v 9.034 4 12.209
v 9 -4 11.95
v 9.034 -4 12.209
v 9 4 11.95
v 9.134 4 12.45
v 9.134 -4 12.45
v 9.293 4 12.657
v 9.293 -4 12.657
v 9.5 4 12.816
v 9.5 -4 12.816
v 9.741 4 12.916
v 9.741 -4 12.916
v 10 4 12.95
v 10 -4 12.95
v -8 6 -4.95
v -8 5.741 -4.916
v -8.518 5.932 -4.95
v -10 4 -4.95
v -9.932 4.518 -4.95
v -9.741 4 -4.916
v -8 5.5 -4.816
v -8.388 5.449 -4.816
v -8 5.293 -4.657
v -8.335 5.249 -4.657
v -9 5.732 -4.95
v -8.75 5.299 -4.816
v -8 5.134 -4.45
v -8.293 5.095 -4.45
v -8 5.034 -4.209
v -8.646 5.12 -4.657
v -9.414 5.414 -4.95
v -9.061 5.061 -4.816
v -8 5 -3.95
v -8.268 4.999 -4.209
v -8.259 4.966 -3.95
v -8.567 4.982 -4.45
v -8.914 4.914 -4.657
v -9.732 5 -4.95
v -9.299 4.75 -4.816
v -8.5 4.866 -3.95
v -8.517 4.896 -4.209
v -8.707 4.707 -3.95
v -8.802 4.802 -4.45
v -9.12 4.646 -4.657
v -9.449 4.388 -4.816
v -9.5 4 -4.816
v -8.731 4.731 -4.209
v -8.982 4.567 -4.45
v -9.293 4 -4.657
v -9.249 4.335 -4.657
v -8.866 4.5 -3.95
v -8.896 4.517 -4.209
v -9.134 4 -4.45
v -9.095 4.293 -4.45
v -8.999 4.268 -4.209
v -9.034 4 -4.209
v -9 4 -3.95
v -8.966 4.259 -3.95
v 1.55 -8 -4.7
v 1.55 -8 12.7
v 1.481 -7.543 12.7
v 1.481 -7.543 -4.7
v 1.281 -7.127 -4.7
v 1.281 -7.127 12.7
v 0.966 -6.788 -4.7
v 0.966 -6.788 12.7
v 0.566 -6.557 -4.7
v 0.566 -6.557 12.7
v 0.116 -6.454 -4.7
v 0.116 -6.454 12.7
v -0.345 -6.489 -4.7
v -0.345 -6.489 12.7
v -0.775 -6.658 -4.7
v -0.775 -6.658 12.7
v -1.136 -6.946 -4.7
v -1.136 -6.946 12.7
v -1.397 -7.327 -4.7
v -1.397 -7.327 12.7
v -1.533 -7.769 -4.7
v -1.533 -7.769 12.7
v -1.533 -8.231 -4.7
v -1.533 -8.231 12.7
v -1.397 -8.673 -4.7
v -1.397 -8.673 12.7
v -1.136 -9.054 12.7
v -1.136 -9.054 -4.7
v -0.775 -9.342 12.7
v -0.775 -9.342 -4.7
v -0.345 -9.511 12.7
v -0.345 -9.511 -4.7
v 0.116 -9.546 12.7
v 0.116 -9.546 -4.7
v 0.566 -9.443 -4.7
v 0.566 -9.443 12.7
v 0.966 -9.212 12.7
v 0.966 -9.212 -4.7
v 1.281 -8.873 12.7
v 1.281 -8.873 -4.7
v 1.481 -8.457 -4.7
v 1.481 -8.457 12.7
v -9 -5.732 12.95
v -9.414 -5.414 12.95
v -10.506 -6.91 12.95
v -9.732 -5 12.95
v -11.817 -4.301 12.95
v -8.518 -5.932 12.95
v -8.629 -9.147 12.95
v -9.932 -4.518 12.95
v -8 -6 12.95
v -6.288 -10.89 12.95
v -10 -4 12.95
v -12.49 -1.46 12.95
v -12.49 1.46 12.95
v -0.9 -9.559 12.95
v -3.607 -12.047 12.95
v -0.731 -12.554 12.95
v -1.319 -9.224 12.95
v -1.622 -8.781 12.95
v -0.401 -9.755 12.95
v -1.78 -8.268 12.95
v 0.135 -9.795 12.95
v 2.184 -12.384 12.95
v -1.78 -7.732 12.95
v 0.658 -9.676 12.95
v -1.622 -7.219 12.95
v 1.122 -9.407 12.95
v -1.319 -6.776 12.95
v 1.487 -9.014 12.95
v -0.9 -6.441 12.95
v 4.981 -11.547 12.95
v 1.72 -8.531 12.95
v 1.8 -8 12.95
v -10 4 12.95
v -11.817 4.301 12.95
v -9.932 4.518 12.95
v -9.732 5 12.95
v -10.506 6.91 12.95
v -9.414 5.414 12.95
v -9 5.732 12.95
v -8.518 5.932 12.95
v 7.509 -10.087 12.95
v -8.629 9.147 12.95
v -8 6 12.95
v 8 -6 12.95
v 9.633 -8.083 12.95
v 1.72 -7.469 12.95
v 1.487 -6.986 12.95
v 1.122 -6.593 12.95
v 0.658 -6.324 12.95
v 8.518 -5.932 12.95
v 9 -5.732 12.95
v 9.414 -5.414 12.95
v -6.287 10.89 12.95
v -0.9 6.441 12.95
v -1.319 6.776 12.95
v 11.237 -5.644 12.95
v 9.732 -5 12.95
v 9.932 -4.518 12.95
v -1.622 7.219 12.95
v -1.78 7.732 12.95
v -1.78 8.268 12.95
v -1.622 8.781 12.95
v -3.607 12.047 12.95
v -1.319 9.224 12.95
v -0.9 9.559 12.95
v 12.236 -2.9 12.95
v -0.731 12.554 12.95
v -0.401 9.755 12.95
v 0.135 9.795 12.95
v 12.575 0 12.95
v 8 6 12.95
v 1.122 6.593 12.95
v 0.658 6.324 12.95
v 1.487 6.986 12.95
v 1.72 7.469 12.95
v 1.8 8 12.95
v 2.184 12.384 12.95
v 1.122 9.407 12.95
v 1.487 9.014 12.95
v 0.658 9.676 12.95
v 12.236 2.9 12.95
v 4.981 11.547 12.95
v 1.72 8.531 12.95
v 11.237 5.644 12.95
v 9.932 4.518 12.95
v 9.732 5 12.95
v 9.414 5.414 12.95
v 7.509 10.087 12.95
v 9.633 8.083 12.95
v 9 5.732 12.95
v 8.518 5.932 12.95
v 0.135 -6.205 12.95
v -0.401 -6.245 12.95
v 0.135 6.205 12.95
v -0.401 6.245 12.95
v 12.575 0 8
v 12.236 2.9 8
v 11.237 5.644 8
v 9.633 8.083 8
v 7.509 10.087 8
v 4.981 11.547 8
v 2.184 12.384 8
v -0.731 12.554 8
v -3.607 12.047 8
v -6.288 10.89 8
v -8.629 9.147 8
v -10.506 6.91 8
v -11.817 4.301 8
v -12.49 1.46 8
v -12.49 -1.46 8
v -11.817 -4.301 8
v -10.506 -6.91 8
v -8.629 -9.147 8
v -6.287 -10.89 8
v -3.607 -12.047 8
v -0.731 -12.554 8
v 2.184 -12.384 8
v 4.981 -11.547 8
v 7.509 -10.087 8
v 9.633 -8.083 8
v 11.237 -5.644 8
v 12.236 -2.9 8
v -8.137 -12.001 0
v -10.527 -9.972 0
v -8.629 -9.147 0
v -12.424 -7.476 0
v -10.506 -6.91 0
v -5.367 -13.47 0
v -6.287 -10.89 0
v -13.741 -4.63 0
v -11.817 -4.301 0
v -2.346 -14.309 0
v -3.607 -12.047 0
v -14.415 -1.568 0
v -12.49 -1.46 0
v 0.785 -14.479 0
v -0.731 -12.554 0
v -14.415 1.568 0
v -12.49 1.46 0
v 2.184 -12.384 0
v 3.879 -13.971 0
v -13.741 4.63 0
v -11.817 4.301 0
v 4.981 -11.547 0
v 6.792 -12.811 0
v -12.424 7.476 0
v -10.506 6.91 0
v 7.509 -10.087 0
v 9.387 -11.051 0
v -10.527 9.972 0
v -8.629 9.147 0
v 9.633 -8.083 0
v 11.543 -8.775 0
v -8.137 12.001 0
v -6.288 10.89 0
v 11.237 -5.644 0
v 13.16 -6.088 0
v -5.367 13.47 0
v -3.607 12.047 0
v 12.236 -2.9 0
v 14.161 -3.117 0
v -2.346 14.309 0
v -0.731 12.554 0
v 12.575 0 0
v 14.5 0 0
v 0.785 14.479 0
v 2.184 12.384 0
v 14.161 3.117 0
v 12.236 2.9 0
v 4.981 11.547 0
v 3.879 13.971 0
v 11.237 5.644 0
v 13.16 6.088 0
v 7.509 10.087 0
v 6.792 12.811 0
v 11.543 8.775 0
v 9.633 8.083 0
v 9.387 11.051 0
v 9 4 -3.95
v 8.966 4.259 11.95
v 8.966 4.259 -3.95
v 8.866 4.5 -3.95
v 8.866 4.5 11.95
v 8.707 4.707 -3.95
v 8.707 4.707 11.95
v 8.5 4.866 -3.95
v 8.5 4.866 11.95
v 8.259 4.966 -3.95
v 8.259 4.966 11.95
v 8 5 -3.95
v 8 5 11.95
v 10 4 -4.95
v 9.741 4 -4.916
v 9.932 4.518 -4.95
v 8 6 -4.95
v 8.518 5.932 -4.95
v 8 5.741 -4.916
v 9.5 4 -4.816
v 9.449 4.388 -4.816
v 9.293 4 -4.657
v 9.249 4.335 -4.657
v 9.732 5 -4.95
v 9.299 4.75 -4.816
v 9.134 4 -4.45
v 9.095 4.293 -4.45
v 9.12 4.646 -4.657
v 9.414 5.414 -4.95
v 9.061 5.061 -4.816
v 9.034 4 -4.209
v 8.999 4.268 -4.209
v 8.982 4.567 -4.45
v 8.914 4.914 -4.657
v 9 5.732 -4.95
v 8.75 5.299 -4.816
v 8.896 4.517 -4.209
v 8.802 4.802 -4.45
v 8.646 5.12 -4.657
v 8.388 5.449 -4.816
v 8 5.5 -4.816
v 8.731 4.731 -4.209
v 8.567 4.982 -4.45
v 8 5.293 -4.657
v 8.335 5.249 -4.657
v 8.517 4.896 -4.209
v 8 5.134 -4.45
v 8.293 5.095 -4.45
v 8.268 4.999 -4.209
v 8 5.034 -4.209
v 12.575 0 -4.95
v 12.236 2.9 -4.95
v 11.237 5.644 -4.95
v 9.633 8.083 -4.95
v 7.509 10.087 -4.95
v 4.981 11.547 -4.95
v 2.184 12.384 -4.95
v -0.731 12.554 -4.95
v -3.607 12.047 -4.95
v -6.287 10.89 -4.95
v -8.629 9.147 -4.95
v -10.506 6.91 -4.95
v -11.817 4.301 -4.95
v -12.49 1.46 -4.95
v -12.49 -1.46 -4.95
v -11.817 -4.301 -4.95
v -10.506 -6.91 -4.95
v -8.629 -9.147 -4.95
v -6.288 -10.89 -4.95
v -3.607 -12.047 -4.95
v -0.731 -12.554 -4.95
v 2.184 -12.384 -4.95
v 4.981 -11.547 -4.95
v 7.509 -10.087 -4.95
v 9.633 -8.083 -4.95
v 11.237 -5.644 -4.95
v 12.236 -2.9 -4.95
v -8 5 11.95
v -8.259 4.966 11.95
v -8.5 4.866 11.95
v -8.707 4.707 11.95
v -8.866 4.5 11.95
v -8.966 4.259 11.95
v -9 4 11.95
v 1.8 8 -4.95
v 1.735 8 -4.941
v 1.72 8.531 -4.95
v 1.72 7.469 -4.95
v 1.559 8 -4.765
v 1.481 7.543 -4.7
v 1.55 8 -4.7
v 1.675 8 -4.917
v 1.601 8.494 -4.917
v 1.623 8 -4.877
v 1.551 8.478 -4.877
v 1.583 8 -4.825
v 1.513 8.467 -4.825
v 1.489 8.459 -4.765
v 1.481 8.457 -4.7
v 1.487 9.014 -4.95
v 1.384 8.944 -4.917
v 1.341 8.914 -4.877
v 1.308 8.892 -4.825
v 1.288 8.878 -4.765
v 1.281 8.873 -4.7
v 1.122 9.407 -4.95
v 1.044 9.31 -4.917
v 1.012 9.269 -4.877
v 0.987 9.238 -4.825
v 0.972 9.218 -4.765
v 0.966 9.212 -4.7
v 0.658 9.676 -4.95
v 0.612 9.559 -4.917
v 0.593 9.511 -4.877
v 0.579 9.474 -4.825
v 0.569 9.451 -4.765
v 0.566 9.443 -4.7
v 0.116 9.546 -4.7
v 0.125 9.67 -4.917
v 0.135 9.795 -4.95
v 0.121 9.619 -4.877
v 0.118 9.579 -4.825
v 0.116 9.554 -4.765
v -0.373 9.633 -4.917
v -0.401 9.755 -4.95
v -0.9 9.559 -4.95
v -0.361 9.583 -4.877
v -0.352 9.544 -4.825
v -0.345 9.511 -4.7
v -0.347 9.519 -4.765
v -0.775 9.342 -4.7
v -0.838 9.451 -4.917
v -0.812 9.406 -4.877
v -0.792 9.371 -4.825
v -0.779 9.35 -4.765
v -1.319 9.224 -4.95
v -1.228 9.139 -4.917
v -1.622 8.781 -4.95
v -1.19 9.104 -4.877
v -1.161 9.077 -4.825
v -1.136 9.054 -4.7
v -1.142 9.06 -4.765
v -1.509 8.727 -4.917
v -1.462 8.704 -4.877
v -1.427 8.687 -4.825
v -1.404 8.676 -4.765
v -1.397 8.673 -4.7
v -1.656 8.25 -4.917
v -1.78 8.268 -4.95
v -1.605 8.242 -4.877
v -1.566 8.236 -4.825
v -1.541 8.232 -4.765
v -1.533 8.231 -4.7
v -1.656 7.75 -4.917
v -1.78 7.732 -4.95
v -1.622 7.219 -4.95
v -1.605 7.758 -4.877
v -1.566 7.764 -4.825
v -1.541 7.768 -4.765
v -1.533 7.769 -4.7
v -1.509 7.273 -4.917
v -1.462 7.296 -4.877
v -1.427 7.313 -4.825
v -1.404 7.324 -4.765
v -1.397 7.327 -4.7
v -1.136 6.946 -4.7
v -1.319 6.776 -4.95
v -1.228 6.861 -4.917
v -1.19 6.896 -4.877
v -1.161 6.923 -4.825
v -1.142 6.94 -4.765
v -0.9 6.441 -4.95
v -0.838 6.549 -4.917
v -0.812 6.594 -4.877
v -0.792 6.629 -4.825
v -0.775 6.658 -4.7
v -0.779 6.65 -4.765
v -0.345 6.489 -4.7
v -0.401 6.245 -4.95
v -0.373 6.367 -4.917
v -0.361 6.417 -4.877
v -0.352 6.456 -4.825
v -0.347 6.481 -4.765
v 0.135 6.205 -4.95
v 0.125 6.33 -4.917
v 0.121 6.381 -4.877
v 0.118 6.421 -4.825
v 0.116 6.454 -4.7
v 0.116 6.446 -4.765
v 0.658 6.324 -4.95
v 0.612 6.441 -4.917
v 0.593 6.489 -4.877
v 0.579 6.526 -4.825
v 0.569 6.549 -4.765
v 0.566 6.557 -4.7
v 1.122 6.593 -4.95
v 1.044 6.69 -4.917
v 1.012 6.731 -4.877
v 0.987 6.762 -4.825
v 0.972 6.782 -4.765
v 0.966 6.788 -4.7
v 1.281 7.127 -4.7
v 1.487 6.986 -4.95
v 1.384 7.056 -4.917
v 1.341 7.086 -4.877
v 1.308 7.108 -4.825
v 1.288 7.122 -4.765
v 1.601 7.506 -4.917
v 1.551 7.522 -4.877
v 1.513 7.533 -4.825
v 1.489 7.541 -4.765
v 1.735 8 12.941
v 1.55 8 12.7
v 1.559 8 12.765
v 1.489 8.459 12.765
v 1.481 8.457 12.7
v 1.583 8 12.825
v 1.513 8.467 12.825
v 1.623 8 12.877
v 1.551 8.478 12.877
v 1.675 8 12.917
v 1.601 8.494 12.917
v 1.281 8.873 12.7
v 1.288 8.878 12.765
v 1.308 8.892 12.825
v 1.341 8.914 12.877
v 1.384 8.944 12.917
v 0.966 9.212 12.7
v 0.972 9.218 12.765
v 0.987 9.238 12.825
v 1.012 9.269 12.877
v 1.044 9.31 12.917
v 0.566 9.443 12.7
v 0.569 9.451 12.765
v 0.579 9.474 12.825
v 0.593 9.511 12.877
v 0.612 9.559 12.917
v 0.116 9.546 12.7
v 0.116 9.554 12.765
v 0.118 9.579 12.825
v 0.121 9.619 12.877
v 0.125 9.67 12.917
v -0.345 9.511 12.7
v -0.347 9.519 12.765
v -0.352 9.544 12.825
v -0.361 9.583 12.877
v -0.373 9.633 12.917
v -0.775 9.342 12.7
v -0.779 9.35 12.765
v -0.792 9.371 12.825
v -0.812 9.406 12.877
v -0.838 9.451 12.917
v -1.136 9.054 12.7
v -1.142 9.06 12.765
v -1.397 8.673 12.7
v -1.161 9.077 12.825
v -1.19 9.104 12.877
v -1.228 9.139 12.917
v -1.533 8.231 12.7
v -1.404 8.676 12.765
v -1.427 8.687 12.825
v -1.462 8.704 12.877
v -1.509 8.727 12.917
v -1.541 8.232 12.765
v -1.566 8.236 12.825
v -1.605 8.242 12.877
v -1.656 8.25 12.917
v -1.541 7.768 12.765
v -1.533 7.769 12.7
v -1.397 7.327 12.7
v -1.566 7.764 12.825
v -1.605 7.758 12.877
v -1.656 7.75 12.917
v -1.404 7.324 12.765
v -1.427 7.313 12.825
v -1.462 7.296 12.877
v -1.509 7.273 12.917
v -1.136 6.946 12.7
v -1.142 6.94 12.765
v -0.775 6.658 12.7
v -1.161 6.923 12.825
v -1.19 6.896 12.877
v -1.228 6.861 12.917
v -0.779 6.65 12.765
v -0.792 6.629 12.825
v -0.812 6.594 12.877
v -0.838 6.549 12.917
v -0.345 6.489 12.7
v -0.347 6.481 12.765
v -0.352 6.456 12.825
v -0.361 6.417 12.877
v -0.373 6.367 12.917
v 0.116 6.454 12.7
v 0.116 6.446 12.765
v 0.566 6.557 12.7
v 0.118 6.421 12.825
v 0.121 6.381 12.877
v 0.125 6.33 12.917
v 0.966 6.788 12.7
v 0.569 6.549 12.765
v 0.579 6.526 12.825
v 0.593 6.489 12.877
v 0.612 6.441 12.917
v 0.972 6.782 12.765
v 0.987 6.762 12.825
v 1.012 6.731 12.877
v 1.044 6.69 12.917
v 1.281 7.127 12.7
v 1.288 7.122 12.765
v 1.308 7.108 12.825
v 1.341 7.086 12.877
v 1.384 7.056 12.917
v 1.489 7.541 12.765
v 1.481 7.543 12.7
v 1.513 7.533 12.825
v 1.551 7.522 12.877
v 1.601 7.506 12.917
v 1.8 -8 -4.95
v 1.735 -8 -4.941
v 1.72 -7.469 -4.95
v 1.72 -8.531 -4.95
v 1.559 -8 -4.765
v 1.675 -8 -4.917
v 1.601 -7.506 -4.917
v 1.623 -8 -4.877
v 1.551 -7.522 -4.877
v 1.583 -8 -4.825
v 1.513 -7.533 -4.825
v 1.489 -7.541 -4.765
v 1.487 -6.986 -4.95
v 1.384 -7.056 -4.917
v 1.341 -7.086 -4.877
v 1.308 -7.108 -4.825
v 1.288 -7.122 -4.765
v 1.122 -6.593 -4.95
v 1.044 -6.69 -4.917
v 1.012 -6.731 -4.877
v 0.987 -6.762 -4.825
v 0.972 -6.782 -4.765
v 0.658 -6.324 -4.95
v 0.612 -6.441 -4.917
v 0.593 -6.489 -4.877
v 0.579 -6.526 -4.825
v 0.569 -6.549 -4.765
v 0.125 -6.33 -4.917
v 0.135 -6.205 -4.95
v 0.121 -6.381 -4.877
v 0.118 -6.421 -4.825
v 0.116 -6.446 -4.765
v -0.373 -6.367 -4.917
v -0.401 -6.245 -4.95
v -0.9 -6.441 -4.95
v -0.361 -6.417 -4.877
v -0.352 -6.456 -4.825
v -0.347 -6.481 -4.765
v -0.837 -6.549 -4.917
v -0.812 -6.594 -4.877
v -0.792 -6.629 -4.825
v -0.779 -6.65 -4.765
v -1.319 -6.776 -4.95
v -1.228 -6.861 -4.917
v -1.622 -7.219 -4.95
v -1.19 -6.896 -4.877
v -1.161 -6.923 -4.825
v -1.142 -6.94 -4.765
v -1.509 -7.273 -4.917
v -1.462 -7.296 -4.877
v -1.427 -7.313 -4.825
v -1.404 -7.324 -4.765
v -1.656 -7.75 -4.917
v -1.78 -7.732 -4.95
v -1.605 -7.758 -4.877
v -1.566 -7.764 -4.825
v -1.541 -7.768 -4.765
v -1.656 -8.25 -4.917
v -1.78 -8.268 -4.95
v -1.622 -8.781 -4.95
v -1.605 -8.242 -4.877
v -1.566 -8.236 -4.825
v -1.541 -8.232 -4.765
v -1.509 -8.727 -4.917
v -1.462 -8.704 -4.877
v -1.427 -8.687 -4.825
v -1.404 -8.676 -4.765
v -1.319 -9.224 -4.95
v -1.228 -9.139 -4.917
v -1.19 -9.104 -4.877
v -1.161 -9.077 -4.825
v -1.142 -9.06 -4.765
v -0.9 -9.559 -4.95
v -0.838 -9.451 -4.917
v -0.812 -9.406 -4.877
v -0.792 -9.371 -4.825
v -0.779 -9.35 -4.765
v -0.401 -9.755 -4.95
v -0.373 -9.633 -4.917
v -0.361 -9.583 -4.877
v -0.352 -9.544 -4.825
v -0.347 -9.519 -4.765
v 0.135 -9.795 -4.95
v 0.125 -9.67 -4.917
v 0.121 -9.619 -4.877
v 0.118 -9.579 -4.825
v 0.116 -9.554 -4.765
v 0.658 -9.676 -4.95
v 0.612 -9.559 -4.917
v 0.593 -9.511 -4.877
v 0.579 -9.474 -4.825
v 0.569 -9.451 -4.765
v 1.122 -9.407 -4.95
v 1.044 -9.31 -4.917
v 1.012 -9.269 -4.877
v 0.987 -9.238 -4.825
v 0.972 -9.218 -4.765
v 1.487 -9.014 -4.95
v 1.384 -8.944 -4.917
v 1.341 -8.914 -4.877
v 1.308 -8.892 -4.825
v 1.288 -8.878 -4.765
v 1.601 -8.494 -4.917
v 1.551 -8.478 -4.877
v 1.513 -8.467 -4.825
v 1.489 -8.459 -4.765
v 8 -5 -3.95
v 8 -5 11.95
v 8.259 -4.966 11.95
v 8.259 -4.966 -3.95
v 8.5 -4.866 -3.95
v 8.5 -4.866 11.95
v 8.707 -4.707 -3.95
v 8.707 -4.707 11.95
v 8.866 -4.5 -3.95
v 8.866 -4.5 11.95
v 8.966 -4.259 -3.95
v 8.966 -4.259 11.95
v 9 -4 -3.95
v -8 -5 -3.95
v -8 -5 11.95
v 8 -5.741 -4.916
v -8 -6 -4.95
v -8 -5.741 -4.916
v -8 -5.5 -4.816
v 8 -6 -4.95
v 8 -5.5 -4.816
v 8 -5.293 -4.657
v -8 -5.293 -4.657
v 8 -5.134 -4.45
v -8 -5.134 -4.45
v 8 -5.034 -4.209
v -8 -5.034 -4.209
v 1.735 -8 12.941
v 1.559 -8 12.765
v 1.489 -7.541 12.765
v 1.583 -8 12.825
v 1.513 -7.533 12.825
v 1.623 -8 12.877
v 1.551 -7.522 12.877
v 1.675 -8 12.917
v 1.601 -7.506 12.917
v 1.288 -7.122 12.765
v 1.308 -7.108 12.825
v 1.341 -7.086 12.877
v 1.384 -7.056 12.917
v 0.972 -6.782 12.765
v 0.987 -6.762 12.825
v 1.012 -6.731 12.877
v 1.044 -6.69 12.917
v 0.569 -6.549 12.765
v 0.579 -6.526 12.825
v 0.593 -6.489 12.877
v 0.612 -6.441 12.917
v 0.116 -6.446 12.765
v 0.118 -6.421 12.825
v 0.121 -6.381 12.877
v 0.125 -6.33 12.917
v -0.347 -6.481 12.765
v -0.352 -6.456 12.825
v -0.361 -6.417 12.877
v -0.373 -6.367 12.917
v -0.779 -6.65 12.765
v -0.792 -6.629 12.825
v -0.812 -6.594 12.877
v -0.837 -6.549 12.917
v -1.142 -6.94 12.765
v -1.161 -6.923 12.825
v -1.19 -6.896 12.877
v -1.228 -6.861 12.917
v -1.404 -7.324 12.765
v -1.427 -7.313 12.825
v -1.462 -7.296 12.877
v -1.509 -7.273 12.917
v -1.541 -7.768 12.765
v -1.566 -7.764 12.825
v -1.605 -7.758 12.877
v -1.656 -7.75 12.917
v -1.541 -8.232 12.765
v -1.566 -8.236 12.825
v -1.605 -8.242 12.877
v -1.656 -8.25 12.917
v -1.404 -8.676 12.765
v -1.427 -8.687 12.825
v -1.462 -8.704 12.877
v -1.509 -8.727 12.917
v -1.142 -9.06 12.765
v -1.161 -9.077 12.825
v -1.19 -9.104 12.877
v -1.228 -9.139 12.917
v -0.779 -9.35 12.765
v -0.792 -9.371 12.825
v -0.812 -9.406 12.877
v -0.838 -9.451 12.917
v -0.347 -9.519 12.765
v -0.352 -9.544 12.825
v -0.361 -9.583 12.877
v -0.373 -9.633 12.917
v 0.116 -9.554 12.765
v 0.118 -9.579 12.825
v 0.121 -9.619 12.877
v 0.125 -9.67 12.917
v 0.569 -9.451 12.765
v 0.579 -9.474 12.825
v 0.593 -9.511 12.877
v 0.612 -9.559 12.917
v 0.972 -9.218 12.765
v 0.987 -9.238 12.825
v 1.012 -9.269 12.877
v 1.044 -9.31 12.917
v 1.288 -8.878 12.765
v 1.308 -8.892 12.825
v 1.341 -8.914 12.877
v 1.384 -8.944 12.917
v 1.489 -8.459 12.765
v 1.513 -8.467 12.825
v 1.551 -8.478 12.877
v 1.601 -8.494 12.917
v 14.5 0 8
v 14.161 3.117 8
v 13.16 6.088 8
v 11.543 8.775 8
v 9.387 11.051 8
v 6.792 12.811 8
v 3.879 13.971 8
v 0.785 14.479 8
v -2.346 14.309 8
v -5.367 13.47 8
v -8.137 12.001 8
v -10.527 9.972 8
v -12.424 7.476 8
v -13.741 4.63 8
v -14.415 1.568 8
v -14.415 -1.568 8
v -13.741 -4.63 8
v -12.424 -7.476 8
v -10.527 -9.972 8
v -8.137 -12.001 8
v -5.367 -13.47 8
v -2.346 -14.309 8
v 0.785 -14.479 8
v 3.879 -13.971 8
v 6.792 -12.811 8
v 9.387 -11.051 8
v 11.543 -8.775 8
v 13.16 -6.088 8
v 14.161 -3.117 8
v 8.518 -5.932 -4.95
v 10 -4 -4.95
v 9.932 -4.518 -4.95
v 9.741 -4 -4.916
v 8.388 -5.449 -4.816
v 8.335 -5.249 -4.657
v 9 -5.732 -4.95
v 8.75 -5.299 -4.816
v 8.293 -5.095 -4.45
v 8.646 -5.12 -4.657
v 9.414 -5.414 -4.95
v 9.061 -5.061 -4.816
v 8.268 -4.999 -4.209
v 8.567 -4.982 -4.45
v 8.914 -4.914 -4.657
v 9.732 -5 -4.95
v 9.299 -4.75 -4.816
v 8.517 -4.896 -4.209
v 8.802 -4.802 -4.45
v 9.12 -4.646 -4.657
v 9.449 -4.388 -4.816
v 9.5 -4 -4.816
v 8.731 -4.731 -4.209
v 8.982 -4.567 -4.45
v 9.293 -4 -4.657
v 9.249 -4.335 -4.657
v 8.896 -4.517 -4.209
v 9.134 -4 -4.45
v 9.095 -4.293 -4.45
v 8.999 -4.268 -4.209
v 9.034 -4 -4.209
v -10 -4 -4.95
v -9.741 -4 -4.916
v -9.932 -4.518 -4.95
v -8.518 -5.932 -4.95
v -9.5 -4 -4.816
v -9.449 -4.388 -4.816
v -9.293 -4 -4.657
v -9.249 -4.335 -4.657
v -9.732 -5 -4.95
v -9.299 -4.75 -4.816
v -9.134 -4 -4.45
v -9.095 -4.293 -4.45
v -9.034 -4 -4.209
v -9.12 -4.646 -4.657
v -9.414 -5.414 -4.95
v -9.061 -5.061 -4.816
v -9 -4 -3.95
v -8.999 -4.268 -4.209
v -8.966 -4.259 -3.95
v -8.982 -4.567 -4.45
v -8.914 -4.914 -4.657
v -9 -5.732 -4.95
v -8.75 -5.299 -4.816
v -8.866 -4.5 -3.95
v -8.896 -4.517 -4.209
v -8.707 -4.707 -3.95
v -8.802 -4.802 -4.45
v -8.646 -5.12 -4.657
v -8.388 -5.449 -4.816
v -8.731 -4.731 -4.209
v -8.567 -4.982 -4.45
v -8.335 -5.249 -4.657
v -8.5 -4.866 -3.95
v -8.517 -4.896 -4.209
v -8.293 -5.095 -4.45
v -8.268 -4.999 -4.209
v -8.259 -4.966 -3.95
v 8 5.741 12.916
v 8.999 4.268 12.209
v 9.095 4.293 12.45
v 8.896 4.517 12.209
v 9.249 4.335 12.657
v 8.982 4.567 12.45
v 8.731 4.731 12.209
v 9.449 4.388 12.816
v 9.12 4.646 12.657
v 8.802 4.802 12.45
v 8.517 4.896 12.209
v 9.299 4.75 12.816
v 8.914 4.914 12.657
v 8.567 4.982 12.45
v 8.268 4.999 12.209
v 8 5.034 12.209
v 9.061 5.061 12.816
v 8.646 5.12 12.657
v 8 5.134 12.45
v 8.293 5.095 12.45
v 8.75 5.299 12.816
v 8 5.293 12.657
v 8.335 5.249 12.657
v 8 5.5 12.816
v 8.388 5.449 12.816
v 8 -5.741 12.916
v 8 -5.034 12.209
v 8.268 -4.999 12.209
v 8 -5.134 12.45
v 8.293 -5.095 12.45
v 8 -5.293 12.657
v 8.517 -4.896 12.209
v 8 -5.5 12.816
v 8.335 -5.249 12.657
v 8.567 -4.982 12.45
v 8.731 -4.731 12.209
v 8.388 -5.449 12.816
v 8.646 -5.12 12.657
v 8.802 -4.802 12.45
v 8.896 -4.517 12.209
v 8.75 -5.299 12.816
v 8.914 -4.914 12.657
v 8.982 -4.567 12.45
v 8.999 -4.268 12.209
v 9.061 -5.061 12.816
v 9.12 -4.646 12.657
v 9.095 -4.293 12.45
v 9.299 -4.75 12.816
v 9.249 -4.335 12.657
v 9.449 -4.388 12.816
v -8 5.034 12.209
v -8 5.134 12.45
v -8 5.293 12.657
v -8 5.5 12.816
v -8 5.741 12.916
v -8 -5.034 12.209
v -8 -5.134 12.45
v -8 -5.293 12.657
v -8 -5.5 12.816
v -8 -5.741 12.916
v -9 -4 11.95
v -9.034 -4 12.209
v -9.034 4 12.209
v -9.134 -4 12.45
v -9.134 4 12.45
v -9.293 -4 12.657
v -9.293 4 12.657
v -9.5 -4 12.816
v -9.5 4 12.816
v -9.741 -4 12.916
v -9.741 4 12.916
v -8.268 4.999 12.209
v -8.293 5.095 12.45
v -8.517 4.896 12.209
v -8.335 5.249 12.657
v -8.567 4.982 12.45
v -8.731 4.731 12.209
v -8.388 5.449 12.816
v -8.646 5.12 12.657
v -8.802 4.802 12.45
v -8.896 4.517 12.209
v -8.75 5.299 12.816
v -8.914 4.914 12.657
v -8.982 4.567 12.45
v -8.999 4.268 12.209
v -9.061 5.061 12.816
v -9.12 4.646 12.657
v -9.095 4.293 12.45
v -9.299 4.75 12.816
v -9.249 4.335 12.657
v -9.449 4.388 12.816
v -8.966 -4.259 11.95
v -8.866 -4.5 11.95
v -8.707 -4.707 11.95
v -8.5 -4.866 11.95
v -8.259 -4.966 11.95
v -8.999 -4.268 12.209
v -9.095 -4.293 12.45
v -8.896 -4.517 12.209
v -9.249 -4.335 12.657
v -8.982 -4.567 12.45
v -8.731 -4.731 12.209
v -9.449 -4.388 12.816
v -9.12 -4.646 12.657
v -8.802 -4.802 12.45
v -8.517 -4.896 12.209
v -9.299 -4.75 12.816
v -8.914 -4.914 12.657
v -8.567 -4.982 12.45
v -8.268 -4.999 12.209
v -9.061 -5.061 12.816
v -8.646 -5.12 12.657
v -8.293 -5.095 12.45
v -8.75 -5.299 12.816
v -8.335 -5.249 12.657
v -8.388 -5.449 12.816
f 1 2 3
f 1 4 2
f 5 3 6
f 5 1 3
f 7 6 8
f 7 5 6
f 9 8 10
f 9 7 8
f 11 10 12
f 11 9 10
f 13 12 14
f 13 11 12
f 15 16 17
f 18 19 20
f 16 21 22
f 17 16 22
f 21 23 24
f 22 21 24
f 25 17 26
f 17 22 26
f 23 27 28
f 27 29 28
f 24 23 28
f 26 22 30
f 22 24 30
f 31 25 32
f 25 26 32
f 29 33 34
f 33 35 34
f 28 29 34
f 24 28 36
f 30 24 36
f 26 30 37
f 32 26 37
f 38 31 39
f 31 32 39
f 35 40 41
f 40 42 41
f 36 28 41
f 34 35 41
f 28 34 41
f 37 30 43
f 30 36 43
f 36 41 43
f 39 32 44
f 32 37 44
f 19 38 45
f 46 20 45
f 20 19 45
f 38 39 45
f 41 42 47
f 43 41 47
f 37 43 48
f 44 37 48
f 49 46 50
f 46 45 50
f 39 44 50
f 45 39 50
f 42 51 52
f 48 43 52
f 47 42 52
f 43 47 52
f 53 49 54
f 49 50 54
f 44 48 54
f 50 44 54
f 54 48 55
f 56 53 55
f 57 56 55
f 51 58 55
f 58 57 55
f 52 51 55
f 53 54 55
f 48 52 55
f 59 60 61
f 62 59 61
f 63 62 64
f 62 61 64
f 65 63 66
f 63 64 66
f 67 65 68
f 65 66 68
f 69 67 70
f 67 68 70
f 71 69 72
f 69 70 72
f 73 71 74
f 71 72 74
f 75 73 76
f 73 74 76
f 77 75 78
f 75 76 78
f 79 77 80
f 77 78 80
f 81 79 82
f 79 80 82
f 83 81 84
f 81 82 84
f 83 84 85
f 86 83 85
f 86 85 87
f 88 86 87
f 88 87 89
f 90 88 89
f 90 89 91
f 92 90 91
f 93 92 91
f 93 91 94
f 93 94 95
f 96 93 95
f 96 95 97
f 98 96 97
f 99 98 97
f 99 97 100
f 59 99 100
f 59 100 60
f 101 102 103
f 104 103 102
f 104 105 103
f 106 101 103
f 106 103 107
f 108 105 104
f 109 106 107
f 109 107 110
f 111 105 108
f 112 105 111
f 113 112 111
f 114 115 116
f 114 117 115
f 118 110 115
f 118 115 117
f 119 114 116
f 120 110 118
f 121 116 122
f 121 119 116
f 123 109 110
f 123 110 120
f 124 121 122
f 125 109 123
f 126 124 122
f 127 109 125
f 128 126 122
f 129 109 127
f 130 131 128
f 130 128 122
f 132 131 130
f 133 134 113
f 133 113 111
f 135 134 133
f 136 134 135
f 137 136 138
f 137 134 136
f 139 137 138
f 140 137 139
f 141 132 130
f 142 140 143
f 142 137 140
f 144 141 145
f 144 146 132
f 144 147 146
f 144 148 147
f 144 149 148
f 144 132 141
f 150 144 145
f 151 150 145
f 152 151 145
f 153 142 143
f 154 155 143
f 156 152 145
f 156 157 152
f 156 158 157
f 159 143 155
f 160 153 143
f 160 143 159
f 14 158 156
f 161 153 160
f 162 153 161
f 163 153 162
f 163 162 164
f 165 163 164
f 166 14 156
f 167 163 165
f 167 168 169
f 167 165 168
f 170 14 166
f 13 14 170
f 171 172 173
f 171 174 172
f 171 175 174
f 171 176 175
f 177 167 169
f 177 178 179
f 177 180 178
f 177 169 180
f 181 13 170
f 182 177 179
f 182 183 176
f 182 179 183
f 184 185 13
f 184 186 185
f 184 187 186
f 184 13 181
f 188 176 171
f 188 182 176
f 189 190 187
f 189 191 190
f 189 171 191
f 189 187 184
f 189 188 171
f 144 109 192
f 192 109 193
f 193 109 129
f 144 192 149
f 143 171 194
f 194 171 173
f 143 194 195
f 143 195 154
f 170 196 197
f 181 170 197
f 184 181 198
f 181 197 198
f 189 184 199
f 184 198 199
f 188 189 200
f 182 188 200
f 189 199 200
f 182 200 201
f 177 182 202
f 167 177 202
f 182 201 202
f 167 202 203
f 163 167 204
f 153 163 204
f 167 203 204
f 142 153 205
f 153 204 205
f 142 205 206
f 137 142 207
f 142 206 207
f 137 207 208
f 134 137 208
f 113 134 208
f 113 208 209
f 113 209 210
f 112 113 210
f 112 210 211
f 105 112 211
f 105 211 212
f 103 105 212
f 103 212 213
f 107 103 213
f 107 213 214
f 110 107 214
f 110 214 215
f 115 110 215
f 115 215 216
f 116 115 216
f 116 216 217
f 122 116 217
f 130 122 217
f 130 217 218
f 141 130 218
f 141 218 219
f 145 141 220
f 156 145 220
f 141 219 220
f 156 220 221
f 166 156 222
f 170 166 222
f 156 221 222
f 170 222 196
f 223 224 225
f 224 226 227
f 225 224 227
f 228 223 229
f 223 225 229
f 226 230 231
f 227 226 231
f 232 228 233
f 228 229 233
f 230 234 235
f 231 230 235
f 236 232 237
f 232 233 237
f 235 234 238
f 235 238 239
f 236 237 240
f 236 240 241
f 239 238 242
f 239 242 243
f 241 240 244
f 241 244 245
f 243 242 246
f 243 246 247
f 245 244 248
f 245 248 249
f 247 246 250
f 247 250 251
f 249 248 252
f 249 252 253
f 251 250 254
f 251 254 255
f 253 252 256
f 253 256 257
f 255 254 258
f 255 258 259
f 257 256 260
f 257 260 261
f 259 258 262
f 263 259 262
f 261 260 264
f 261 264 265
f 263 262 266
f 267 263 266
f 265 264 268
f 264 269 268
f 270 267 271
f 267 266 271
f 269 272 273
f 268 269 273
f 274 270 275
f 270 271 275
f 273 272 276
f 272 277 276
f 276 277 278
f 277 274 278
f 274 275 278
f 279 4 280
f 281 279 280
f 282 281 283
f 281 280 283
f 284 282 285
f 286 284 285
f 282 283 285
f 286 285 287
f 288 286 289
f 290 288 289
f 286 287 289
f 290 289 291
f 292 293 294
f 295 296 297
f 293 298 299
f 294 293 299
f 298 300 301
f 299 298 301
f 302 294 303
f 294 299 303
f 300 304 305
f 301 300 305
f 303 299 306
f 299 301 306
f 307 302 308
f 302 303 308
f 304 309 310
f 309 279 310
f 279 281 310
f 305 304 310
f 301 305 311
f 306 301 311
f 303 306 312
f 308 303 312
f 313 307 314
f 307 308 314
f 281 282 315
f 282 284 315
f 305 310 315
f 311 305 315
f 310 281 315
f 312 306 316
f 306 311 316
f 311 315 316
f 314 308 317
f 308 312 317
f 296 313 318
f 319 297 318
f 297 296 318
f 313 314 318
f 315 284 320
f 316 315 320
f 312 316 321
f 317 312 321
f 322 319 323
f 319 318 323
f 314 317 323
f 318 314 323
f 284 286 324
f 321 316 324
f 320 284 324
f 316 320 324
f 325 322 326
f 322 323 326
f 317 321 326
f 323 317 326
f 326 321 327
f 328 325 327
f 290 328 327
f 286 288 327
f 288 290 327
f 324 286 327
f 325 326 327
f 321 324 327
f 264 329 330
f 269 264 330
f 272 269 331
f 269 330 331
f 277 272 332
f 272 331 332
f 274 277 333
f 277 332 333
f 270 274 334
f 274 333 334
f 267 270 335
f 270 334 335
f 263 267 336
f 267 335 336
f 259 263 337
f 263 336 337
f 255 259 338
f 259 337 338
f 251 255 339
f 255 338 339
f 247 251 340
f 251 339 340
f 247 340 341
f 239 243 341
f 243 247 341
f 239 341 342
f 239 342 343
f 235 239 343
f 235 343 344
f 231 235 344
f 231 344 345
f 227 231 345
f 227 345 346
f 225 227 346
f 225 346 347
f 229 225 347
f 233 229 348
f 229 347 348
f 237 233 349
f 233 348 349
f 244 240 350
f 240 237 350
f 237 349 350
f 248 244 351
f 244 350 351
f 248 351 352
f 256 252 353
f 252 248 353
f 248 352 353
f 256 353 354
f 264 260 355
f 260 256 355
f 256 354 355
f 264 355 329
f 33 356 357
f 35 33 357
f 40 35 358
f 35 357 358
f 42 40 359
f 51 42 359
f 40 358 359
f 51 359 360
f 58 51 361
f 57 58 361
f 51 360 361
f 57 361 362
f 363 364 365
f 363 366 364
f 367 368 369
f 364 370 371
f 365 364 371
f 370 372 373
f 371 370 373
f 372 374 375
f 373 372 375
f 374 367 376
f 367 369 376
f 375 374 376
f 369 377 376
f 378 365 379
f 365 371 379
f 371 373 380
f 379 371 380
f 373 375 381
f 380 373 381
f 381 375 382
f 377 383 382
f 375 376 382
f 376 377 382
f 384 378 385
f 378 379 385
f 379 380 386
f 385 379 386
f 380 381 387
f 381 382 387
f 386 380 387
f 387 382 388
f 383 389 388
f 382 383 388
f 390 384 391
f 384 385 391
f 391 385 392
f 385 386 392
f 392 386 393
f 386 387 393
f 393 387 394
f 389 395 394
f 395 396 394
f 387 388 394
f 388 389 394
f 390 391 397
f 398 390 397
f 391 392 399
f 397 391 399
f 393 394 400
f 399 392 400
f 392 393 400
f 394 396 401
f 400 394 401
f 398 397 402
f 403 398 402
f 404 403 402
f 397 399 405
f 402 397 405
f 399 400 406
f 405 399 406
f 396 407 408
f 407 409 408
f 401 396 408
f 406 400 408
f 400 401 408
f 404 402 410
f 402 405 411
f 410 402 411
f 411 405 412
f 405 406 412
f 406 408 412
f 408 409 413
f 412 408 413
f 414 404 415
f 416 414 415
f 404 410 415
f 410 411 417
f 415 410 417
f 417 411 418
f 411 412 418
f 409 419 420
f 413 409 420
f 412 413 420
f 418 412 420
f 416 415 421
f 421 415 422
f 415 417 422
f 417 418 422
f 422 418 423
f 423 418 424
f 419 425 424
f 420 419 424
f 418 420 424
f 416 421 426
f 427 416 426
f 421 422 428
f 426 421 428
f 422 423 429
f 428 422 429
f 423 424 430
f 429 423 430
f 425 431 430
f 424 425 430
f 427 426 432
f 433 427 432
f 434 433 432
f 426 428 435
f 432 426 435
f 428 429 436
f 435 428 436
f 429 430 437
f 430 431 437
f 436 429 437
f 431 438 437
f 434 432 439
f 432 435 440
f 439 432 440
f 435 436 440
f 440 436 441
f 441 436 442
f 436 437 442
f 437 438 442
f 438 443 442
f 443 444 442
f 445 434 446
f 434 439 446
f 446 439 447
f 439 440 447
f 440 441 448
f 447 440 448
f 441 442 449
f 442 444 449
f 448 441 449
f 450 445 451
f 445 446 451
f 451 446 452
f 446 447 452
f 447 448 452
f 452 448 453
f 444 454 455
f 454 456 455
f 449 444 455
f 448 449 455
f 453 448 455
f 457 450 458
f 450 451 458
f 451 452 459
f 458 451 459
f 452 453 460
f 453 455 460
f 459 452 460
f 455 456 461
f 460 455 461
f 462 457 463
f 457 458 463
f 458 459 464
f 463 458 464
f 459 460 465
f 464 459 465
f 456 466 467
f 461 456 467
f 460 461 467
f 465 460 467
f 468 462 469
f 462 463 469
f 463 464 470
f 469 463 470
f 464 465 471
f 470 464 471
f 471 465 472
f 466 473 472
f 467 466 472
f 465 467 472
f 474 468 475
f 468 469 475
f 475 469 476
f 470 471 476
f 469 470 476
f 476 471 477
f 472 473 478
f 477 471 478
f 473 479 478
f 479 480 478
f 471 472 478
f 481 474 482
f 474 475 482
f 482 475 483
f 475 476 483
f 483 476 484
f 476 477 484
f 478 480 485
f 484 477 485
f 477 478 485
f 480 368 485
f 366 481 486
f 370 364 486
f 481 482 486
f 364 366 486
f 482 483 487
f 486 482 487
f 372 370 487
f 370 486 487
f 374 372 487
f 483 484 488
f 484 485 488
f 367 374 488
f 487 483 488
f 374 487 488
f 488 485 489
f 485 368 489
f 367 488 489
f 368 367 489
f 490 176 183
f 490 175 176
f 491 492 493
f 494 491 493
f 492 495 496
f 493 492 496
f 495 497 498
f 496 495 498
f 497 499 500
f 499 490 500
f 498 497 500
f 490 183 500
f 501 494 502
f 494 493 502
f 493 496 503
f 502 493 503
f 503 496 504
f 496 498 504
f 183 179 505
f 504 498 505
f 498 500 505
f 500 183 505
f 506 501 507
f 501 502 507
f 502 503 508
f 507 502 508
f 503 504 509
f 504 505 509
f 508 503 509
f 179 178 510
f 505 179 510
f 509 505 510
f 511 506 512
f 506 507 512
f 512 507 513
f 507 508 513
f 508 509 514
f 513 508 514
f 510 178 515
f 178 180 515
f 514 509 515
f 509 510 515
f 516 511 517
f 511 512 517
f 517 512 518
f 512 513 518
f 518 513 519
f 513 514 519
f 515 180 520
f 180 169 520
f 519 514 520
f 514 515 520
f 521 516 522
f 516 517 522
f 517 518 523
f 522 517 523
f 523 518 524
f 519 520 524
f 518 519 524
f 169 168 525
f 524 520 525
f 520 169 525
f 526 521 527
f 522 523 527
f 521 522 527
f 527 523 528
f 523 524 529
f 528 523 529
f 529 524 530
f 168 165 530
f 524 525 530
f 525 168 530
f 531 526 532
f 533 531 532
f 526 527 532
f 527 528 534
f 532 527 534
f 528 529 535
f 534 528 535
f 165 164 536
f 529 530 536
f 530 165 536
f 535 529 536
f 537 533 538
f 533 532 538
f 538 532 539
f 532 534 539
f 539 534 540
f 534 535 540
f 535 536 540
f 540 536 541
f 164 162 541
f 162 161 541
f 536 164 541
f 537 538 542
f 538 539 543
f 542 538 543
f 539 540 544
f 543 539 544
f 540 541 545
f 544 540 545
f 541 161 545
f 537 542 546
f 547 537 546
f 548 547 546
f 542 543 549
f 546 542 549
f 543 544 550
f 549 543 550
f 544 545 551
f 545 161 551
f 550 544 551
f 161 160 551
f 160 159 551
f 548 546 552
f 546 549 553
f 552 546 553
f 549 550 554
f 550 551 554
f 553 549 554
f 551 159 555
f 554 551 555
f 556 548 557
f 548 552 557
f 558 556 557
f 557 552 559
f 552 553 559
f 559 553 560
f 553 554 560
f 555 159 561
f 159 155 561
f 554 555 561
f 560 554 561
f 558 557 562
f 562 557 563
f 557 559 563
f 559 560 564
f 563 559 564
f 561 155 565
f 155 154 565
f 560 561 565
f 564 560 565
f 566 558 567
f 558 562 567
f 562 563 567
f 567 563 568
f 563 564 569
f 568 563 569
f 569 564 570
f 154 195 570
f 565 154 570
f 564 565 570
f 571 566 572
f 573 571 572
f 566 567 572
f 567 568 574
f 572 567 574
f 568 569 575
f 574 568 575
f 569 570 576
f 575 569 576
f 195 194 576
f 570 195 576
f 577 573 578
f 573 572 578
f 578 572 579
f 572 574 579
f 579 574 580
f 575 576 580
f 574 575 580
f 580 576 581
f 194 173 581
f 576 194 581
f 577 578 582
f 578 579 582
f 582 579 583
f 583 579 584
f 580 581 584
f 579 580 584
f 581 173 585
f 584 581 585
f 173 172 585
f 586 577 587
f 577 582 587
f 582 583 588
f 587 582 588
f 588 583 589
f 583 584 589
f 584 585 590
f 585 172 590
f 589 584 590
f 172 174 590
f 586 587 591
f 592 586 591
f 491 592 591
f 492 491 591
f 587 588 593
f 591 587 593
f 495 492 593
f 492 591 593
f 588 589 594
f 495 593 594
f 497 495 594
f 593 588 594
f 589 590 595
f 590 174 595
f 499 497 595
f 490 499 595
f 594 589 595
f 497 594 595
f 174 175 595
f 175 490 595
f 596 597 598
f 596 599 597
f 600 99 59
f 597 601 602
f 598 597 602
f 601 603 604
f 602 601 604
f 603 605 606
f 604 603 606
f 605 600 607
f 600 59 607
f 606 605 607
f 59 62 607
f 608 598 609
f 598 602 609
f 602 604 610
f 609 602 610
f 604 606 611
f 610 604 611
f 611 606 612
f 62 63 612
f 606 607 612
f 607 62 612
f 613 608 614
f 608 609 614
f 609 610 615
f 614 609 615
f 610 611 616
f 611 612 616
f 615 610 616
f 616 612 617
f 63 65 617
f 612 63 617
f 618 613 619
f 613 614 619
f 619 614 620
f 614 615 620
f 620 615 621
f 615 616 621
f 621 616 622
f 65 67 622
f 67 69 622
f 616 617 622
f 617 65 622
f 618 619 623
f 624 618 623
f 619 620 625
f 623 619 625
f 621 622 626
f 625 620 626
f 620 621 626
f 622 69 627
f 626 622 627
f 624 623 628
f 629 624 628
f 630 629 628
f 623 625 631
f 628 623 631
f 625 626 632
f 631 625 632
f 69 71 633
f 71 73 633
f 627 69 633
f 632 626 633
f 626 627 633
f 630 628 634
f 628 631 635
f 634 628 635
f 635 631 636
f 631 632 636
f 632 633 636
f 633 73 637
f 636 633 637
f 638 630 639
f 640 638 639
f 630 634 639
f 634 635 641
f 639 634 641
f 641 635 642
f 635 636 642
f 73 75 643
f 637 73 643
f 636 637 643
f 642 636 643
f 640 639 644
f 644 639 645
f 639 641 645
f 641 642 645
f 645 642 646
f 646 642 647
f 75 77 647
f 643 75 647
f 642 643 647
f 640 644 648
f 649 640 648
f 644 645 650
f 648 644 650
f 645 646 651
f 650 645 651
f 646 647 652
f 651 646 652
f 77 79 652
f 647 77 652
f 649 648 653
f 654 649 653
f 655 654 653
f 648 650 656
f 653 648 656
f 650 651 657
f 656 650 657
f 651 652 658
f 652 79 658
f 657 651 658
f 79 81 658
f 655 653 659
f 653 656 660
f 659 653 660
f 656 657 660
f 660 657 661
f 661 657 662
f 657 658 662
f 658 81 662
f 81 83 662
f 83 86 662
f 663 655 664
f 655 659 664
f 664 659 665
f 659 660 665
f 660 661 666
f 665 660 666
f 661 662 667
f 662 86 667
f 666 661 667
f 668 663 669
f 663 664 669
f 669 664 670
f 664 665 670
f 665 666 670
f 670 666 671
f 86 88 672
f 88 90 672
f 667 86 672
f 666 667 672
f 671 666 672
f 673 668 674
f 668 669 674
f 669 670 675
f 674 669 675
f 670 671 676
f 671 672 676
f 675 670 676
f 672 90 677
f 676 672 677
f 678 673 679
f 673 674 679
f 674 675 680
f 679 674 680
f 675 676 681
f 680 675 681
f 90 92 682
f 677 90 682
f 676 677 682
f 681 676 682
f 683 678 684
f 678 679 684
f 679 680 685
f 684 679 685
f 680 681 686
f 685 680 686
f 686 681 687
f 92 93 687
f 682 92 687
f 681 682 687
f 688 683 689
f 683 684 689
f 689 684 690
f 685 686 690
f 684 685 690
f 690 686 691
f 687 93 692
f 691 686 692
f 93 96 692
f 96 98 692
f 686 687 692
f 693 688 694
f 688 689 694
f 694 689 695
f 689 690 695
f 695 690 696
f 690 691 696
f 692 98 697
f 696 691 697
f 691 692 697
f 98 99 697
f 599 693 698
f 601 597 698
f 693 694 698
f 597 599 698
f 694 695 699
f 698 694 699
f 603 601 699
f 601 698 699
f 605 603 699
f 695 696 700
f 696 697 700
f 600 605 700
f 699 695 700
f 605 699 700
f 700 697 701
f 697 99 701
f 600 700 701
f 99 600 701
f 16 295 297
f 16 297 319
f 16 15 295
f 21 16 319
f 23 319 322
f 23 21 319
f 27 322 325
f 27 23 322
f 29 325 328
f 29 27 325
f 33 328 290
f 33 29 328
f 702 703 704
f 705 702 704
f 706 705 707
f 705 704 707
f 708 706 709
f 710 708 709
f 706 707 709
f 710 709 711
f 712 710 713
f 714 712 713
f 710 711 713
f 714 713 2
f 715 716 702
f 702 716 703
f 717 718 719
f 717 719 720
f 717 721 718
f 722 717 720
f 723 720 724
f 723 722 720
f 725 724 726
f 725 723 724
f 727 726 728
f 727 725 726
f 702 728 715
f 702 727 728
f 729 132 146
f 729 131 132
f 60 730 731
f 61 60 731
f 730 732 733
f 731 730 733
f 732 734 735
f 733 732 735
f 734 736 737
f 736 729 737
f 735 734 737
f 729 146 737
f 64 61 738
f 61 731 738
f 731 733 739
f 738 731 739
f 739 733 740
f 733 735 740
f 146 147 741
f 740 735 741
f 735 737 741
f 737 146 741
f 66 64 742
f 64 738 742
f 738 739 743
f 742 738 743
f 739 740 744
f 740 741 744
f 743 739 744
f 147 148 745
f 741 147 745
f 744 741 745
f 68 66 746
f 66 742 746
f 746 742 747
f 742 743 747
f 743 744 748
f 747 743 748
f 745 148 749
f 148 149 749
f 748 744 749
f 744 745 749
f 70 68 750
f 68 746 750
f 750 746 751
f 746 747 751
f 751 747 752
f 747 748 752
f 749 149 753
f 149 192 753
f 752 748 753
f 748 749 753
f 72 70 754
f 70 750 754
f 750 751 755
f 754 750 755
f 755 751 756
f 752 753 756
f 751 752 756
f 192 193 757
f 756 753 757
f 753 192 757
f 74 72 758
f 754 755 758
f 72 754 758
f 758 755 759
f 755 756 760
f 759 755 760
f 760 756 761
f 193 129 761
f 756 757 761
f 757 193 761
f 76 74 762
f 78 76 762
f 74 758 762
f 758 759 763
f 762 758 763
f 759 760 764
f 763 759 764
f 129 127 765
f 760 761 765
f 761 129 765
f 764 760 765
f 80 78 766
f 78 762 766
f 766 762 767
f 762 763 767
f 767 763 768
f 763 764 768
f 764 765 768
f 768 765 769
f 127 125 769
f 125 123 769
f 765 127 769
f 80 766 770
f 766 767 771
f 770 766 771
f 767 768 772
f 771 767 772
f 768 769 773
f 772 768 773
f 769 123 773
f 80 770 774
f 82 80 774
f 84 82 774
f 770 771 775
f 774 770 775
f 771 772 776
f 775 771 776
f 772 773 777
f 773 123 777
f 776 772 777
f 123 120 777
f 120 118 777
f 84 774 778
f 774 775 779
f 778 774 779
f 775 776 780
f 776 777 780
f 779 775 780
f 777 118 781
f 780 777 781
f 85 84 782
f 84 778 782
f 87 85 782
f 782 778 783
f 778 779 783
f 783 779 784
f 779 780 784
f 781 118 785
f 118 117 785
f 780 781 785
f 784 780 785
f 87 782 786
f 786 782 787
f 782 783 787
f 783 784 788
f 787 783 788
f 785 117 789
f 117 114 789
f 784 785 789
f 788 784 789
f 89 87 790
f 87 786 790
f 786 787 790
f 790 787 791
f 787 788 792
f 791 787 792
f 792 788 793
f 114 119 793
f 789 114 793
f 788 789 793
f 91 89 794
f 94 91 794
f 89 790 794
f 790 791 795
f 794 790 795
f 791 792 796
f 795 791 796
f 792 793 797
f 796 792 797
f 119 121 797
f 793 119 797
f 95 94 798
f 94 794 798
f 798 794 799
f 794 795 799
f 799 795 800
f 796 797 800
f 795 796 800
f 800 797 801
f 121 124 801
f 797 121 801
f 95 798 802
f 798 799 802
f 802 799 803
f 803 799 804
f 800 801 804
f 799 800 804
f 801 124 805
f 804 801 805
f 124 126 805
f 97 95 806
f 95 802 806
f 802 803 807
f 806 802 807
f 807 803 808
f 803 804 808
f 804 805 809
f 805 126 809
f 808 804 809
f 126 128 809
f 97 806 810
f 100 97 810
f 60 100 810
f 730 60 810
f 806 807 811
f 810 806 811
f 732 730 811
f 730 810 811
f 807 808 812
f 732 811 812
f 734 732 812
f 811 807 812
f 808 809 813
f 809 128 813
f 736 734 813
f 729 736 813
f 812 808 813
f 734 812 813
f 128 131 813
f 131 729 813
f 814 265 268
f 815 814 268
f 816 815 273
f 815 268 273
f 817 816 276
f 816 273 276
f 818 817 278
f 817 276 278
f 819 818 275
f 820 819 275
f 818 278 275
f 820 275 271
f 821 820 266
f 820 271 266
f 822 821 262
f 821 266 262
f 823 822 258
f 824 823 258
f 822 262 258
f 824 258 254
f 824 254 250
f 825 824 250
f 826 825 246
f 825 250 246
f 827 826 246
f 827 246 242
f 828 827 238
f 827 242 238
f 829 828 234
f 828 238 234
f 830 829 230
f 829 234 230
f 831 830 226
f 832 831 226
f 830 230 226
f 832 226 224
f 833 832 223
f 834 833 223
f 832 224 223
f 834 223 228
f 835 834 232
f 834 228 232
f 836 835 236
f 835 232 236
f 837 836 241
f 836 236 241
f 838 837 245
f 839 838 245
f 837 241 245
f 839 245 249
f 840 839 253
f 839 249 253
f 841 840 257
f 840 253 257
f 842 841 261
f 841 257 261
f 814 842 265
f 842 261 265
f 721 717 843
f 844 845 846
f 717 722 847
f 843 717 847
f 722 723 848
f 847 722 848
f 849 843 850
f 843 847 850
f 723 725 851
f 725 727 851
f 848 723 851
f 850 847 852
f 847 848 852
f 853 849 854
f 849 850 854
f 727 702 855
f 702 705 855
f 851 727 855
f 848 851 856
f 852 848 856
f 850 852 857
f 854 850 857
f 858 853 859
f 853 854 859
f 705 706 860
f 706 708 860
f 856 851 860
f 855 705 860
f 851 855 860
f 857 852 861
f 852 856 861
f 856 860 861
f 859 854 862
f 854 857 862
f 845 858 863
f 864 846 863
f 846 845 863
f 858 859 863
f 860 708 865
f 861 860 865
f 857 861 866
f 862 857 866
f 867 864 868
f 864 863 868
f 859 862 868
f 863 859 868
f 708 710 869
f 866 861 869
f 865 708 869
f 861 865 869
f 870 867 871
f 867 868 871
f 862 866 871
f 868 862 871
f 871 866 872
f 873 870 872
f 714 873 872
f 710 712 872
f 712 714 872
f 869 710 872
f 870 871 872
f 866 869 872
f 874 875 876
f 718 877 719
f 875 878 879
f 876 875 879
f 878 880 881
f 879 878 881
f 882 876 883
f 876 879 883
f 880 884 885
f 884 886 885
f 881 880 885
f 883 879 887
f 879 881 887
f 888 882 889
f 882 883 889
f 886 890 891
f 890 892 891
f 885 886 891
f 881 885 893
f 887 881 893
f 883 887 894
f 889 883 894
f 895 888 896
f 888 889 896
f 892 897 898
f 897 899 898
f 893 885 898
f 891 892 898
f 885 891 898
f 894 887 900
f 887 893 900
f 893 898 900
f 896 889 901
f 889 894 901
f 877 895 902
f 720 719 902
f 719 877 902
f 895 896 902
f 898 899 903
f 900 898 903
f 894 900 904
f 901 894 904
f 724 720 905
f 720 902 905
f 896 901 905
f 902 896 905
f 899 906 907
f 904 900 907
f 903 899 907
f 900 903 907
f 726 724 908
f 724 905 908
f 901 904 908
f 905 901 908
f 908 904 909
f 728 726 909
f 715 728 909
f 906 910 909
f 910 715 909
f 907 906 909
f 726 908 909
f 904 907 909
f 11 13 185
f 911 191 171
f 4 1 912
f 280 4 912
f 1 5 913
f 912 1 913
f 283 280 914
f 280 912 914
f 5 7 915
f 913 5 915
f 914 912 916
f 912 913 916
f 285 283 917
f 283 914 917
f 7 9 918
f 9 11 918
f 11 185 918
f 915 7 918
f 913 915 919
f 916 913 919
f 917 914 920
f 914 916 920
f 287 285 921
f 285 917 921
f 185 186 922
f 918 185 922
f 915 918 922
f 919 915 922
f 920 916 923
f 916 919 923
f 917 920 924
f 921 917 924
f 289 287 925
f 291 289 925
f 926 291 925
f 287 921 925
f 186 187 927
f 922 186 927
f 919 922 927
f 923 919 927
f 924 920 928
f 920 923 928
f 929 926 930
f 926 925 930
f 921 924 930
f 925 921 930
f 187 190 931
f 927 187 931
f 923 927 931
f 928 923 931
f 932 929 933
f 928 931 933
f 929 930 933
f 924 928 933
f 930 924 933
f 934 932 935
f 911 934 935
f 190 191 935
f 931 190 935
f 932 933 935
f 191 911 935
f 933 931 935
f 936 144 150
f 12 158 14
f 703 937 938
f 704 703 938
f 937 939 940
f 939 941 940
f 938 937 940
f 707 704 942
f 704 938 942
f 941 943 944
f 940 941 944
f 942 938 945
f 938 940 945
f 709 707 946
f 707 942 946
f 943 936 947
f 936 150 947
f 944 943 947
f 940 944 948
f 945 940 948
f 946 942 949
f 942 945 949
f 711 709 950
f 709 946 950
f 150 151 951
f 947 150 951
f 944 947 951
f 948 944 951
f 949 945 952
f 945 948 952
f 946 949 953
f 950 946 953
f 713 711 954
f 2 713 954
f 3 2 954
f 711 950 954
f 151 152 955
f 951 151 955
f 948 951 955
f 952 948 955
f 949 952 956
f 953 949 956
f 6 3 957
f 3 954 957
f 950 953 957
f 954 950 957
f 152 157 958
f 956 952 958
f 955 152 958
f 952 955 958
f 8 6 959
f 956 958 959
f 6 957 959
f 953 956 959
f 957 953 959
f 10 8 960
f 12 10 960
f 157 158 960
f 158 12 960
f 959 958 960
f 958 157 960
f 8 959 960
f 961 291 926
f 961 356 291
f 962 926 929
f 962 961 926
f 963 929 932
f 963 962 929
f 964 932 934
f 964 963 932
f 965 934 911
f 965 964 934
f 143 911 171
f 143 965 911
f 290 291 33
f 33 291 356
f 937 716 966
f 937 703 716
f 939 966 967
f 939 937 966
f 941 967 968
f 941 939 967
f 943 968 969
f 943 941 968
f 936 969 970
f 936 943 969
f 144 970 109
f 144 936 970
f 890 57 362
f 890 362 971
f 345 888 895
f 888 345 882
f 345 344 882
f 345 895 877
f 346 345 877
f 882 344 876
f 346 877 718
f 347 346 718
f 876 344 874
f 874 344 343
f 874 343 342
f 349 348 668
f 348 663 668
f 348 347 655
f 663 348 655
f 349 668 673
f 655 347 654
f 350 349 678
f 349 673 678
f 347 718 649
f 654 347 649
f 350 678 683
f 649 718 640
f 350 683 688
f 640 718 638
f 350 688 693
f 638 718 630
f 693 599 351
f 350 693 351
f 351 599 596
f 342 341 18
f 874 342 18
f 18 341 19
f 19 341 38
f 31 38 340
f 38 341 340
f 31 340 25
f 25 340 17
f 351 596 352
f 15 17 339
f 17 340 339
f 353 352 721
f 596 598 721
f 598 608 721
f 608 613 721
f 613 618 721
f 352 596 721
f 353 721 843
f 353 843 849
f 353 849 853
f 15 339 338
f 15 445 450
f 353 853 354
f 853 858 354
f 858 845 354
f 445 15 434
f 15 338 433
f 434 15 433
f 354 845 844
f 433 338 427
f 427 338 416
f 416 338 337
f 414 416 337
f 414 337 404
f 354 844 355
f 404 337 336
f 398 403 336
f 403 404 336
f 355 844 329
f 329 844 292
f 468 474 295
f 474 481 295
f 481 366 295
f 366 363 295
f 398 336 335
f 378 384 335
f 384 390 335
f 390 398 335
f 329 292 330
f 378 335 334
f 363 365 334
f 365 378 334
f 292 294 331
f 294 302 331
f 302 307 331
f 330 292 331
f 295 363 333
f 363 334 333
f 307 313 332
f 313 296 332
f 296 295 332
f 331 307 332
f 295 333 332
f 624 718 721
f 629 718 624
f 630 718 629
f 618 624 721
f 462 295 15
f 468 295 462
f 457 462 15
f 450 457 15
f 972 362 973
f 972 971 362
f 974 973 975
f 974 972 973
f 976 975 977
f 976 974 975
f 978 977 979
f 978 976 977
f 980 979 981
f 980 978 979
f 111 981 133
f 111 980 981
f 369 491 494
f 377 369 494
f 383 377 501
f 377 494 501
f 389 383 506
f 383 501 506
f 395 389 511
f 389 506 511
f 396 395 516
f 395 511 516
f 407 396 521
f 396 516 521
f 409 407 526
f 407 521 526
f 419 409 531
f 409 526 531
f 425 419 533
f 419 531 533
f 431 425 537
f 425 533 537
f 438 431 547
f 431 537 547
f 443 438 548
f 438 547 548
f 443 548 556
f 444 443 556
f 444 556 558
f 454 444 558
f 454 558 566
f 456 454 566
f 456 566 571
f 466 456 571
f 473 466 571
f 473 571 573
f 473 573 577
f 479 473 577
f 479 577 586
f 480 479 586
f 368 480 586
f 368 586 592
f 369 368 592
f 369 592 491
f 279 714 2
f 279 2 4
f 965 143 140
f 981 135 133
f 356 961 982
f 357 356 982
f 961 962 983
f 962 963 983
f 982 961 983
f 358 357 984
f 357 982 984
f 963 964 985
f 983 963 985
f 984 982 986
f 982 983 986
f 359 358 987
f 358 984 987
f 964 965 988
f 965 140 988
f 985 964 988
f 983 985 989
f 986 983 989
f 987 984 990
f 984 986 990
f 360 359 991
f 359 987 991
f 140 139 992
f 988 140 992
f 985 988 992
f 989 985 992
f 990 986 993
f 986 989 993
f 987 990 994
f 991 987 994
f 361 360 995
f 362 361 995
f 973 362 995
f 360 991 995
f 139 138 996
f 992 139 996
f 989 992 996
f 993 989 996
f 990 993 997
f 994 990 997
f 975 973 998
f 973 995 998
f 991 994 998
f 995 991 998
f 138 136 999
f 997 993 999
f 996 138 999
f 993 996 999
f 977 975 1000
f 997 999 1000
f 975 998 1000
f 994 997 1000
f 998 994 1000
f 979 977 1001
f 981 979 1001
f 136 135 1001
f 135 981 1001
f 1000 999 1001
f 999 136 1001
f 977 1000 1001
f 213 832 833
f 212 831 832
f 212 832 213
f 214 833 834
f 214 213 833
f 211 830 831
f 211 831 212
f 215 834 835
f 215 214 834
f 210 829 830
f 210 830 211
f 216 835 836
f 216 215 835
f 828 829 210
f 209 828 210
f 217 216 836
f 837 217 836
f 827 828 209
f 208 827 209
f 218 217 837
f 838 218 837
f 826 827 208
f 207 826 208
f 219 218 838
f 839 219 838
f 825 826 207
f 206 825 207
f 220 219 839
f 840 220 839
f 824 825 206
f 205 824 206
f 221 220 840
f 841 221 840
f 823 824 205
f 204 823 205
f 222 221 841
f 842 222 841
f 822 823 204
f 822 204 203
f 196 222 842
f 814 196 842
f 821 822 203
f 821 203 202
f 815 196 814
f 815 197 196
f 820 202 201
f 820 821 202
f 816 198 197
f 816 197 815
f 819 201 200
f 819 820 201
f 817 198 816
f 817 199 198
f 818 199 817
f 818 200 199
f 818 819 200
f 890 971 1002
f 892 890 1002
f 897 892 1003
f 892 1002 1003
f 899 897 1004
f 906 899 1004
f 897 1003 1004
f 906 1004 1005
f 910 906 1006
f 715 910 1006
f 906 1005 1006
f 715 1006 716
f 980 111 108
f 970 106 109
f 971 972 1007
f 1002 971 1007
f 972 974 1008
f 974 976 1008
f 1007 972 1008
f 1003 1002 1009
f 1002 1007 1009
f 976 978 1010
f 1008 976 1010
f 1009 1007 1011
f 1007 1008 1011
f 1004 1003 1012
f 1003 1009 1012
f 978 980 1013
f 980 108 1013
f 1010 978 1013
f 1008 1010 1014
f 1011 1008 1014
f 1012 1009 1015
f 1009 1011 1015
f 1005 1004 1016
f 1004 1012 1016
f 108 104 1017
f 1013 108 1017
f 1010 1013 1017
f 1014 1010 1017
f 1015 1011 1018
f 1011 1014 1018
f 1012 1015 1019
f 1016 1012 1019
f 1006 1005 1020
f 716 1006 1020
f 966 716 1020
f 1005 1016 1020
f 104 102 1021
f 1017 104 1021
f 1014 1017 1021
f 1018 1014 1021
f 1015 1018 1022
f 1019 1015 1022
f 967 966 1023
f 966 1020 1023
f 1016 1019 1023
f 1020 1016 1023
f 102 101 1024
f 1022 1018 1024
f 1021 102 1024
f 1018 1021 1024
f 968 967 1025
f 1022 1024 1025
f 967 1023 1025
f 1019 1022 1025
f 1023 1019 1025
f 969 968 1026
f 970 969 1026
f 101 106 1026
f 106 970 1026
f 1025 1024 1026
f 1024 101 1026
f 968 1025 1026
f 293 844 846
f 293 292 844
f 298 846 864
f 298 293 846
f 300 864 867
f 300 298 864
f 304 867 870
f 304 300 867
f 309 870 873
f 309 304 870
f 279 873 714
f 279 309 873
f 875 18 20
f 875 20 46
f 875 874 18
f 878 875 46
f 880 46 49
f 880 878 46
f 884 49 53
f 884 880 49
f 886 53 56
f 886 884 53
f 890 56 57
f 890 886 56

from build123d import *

# Parameters (mm, degrees)
ESQUISSE1_R             = 14.5
BOSS_EXTRU_1_DEPTH      = 8
BOSS_EXTRU_2_DEPTH      = 4.95
BOSS_EXTRU_2_DEPTH_BACK = 12.95
ESQUISSE2_R             = 12.575
ESQUISSE3_R             = 1.55
ENL_V_MAT_EXTRU_1_DEPTH = 28.219662011
CONG_1_R                = 1
CONG_2_R                = 0.25


with BuildPart() as part:
    # Esquisse1 → Boss.-Extru.1 (new body)
    with BuildSketch(Plane.XY):
        Circle(ESQUISSE1_R)
    extrude(amount=BOSS_EXTRU_1_DEPTH)

    # Esquisse2 → Boss.-Extru.2 (add, two sides: drawn at the far end of the back side and taken through both)
    with BuildSketch(Plane.XY.offset(8).offset(-BOSS_EXTRU_2_DEPTH_BACK)):
        Circle(ESQUISSE2_R)
    extrude(amount=BOSS_EXTRU_2_DEPTH + BOSS_EXTRU_2_DEPTH_BACK)

    # Esquisse3 → Enlèv. mat.-Extru.1 (cut, through all)
    with BuildSketch(Plane.XY.offset(12.95)):
        with Locations((0, 8)):
            Circle(ESQUISSE3_R)
        with Locations((0, -8)):
            Circle(ESQUISSE3_R)
        with BuildLine():
            Line((-8, -5), (8, -5))
            ThreePointArc((8, -5), (8.707106781, -4.707106781), (9, -4))
            Line((9, -4), (9, 4))
            ThreePointArc((9, 4), (8.707106781, 4.707106781), (8, 5))
            Line((8, 5), (-8, 5))
            ThreePointArc((-8, 5), (-8.707106781, 4.707106781), (-9, 4))
            Line((-9, 4), (-9, -4))
            ThreePointArc((-9, -4), (-8.707106781, -4.707106781), (-8, -5))
        make_face()
    extrude(amount=-ENL_V_MAT_EXTRU_1_DEPTH, mode=Mode.SUBTRACT)

    # Congé1
    cong_1_edges = [part.edges().sort_by_distance(p)[0] for p in [
        (8.707106781, 4.707106781, -4.95),
        (9, 0, -4.95),
        (8.707106781, -4.707106781, -4.95),
        (0, -5, -4.95),
        (-8.707106781, -4.707106781, -4.95),
        (-9, 0, -4.95),
        (-8.707106781, 4.707106781, -4.95),
        (0, 5, -4.95),
        (8.707106781, 4.707106781, 12.95),
        (0, 5, 12.95),
        (-8.707106781, 4.707106781, 12.95),
        (-9, 0, 12.95),
        (-8.707106781, -4.707106781, 12.95),
        (0, -5, 12.95),
        (8.707106781, -4.707106781, 12.95),
        (9, 0, 12.95),
    ]]
    fillet(cong_1_edges, radius=CONG_1_R)

    # Congé2
    cong_2_edges = [part.edges().sort_by_distance(p)[0] for p in [
        (-1.55, -8, -4.95),
        (-1.55, -8, 12.95),
        (-1.55, 8, -4.95),
        (-1.55, 8, 12.95),
    ]]
    fillet(cong_2_edges, radius=CONG_2_R)


solid = part.part
